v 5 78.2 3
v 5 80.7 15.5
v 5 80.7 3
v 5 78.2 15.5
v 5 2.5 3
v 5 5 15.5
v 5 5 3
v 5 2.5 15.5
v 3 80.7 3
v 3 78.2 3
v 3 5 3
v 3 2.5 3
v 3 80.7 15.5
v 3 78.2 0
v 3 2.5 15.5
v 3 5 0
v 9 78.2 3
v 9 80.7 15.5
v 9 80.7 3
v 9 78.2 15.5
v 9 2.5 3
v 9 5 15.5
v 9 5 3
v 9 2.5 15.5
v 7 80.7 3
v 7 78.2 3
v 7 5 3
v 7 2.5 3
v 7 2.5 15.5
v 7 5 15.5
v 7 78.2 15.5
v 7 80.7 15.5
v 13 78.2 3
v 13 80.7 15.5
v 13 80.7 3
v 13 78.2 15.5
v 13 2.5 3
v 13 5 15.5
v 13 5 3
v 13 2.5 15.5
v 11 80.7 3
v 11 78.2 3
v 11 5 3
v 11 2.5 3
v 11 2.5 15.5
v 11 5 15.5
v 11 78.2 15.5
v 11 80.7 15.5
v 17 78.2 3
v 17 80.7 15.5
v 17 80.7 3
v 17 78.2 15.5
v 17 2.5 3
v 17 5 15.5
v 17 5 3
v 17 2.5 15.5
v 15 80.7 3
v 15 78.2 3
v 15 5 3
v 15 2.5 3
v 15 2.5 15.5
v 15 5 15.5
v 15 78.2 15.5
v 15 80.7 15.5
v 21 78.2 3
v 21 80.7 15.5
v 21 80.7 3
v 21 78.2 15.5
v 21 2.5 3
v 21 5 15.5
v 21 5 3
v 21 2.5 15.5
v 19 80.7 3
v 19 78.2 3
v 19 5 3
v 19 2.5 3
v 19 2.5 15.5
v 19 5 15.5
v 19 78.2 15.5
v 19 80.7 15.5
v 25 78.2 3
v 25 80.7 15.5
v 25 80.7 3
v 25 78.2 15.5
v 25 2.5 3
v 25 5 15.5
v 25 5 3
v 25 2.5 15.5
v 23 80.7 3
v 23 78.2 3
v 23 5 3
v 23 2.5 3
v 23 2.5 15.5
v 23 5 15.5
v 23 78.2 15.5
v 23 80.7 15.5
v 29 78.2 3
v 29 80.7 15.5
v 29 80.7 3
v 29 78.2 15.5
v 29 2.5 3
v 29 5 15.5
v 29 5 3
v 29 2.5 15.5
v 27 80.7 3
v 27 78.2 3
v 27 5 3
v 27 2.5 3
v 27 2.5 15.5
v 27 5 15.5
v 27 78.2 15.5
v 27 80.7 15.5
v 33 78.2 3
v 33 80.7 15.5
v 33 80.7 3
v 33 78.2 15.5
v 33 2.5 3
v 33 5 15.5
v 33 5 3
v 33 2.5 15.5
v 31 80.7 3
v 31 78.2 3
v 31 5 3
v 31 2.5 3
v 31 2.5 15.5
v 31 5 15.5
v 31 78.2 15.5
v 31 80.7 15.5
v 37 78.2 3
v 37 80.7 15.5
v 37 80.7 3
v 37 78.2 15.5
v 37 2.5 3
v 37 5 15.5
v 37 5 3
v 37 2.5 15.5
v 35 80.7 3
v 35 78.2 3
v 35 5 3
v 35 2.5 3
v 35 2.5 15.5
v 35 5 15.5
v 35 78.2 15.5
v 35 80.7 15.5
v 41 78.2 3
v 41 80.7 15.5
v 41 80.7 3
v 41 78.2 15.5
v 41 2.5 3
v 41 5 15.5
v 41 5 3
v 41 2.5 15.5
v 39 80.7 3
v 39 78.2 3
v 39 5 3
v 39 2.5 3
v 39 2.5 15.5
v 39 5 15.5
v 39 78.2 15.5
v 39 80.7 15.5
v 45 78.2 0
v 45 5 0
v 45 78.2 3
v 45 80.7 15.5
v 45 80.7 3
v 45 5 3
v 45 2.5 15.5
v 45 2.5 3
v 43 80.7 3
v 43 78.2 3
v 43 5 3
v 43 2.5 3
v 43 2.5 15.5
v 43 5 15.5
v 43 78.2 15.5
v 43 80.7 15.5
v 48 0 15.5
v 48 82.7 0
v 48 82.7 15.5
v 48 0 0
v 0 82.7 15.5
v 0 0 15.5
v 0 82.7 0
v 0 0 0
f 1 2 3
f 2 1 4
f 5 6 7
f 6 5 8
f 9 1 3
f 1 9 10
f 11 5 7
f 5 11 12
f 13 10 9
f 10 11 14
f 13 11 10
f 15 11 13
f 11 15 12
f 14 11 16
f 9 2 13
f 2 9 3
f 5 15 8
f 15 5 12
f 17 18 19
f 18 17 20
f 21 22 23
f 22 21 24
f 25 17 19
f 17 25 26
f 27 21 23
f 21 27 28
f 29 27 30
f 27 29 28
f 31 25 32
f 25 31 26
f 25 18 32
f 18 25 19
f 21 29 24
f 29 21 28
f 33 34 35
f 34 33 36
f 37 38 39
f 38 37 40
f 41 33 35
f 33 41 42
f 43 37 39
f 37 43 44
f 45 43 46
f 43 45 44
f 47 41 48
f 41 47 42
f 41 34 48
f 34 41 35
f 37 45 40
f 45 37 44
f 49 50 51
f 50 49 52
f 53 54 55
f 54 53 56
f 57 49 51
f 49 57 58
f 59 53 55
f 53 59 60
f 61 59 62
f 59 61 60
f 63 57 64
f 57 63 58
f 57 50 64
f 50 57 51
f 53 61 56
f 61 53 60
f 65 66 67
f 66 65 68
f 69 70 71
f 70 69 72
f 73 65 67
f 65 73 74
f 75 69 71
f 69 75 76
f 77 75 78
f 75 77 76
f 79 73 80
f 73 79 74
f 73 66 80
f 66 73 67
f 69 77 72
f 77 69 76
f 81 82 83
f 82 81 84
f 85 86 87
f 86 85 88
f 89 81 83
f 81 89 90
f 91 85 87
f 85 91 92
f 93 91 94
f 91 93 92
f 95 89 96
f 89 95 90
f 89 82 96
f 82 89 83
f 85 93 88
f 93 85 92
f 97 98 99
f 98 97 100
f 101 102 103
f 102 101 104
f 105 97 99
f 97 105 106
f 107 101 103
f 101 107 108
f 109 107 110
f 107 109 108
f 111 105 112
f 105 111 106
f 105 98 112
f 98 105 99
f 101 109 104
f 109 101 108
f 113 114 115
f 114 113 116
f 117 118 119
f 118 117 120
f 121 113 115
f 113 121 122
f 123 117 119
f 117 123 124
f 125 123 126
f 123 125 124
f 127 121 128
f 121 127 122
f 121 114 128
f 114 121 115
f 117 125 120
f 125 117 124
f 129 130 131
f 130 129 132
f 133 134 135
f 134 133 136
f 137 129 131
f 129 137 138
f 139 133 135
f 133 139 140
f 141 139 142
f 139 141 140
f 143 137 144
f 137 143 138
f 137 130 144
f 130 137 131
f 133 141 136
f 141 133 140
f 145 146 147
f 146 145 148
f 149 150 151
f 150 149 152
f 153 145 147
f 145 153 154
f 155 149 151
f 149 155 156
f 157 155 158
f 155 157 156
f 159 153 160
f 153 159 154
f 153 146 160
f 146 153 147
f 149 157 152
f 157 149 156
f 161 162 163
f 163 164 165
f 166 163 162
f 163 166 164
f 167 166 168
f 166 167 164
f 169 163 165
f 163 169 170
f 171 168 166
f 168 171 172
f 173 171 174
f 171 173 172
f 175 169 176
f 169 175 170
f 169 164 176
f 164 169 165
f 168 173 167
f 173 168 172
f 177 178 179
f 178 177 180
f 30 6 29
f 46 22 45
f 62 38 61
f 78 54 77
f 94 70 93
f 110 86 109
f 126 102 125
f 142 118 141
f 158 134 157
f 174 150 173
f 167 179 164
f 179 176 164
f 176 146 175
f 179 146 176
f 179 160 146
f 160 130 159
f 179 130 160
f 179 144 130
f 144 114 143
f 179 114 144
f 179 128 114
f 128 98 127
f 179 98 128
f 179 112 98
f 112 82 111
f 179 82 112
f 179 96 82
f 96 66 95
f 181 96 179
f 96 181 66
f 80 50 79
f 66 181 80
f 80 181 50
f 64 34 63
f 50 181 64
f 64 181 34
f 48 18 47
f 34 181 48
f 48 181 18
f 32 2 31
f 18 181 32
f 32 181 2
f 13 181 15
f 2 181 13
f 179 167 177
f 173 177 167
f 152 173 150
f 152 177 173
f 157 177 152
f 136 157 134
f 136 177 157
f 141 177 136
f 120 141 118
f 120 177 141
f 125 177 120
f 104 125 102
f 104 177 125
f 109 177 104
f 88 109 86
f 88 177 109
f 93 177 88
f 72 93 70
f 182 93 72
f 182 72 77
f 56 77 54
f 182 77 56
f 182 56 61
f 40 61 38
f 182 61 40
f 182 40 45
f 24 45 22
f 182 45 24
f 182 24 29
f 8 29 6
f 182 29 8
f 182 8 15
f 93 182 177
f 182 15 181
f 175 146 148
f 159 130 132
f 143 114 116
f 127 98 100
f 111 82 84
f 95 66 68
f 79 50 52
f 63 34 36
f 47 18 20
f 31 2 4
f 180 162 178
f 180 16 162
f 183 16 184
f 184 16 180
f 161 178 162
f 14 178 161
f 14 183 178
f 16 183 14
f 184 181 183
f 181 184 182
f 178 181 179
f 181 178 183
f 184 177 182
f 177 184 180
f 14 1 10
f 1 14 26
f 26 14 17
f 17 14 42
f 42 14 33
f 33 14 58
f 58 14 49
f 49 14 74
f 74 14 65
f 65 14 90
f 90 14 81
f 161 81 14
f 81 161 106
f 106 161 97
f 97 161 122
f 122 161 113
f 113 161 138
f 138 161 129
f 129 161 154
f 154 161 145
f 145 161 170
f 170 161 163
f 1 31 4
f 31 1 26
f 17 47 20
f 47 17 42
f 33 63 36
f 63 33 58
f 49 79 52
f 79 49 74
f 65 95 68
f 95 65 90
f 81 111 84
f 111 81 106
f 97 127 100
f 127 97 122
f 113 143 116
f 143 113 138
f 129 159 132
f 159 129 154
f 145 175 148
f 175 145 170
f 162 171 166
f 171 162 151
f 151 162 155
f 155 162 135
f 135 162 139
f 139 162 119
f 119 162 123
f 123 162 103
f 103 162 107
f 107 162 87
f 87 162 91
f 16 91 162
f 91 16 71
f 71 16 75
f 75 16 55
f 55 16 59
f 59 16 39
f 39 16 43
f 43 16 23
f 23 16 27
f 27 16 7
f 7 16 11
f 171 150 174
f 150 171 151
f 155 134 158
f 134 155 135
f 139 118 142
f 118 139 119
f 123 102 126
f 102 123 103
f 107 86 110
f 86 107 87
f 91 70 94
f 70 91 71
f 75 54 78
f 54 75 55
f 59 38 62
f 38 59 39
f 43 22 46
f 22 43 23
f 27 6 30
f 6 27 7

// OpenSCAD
// Parametric Microscope Slide Holder
// Original author: Lucas Wilder — Michigan Technological University — EE 4777
//
// A parametric holder for standard microscope slides.
// Generates a rack with evenly-spaced slots and a center cutout
// for easy slide access.
//
// Parameters:
//   slides    — Number of slide slots (default: 10)
//   thickness — Slide thickness in mm (default: 1)
//   length    — Slide length in mm (default: 76.2, standard 3")
//   width     — Slide width in mm (default: 25, standard 1")

// --- Parameters ---
slides = 10;       // Number of slides
thickness = 1;     // Slide thickness (mm)
length = 76.2;     // Slide length (mm) — standard: 75–76.2
width = 25;        // Slide width (mm)  — standard: 25–26

// --- Derived dimensions ---
slot_spacing = 4;                       // Center-to-center slot distance (mm)
slot_tolerance = 1;                     // Extra width per slot for clearance (mm)
body_width = slot_spacing * slides + 8; // Total body width
body_depth = length + 6.5;             // Total body depth (slide + margin)
body_height = (width / 2) + 3;         // Total body height
wall_inset = 3;                        // Inset from body edge to first slot
floor_inset = 3;                       // Floor thickness under slots

// --- Geometry ---
difference() {
    // Main body
    cube(size = [body_width, body_depth, body_height], center = false);

    // Slide slots with tolerance
    for (i = [0 : 1 : slides]) {
        translate([wall_inset + (slot_spacing * i), 2.5, floor_inset])
            cube(size = [thickness + slot_tolerance, length + 2, width], center = false);
    }

    // Center cutout for easy slide access
    translate([wall_inset, 5, -1])
        cube(size = [slot_spacing * slides + 2, length - 3, width + 4], center = false);
}
